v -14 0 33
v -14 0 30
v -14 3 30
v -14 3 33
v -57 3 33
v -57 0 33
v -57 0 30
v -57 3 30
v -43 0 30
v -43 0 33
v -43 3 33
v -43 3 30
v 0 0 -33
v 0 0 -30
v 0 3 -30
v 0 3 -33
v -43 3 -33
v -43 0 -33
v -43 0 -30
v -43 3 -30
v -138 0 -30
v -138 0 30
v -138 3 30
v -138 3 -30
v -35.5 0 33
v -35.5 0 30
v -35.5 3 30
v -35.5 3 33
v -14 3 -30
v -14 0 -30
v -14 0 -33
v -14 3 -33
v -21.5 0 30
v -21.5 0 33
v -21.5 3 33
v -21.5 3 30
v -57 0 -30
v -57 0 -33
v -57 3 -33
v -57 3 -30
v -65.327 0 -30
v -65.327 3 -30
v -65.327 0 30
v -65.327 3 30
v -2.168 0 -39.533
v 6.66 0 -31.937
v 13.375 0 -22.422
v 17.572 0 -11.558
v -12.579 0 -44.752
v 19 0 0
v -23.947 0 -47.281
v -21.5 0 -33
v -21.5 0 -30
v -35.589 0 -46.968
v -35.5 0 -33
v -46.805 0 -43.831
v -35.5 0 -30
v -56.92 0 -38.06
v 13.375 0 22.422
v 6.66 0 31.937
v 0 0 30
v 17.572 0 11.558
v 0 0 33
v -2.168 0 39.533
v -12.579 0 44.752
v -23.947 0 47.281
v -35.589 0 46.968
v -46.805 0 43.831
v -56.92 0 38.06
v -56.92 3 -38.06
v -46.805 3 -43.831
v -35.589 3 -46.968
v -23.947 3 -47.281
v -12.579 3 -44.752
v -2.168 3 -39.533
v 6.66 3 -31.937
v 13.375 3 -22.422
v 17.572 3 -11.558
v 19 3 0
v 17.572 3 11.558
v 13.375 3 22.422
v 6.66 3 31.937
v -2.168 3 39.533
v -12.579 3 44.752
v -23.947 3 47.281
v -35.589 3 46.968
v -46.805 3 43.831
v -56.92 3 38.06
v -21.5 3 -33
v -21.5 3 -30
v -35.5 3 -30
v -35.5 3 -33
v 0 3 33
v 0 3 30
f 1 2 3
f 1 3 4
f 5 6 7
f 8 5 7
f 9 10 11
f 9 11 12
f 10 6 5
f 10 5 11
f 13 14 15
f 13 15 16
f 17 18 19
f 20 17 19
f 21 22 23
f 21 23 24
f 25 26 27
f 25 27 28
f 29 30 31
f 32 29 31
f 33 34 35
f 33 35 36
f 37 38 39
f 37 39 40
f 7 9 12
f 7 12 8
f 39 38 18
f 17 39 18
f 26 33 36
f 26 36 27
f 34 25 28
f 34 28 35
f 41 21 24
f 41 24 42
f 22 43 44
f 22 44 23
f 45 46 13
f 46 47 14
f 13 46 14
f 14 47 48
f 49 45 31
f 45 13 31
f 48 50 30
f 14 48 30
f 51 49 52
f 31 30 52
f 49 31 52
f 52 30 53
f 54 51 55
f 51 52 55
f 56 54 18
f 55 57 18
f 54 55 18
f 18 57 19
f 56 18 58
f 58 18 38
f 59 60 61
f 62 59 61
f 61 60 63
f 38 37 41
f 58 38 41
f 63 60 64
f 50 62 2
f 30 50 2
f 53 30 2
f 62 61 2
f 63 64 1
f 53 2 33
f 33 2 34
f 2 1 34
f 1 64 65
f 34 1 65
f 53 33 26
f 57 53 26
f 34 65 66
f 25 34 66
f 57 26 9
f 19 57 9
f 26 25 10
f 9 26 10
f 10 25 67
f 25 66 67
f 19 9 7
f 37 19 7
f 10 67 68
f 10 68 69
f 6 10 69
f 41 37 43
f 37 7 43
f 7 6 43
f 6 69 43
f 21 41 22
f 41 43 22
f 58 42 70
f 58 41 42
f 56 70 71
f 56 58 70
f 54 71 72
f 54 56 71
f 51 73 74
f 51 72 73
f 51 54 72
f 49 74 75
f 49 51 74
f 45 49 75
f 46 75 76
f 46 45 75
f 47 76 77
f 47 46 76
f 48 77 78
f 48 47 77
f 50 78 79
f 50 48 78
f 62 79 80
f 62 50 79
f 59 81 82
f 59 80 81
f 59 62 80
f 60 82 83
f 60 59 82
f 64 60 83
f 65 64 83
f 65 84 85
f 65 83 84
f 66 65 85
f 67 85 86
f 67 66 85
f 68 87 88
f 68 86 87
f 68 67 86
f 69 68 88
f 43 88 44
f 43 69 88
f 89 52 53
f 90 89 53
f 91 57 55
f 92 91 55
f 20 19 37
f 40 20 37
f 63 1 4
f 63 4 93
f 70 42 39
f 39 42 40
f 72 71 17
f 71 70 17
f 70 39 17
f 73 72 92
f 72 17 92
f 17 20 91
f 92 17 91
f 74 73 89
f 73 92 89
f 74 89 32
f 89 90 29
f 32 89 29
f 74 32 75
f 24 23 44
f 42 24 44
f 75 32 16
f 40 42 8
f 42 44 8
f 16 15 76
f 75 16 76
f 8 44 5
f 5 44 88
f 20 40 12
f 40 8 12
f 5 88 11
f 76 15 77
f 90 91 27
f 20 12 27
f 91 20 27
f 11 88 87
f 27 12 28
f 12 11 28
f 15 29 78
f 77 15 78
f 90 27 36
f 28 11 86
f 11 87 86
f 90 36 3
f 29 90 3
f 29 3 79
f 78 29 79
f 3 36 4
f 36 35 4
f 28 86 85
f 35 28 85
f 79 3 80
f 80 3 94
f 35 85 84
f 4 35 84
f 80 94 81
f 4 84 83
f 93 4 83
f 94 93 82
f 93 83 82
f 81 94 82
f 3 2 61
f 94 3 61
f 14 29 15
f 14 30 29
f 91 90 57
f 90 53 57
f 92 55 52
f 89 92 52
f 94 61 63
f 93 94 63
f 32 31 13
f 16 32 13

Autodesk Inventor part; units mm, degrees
ref_plane "YZ Plane" through (0, 0, 0) normal (1, 0, 0) x (0, 1, 0)
ref_plane "XZ Plane" through (0, 0, 0) normal (0, 1, 0) x (-1, 0, 0)
ref_plane "XY Plane" through (0, 0, 0) normal (0, 0, 1) x (1, 0, 0)
sketch "Boceto1" plane through (0, 0, 0) normal (0, 1, 0) x (-1, 0, 0)
  circle A0 centre (28.5, 0) radius 1.5
  circle A1 centre (28.5, -8) radius 1.5
  circle A2 centre (28.5, 8) radius 1.5
  circle A3 centre (36.5, 0) radius 1.5
  circle A4 centre (20.5, 0) radius 1.5
  circle A5 centre (28.5, 0) radius 47.5
  line L0 (57, 33) -> (43, 33)
  line L1 (43, 33) -> (43, 30)
  line L2 (35.5, 30) -> (35.5, 33)
  line L3 (35.5, 33) -> (21.5, 33)
  line L4 (21.5, 33) -> (21.5, 30)
  line L5 (14, 30) -> (14, 33)
  line L6 (14, 33) -> (0, 33)
  line L7 (43, 30) -> (57, 30)
  line L8 (21.5, 30) -> (35.5, 30)
  line L9 (14, 30) -> (0, 30)
  line L10 (0, 30) -> (0, 33)
  line L11 (57, 33) -> (57, 30)
  line L12 (35.5, -30) -> (35.5, -33)
  line L13 (21.5, -30) -> (35.5, -30)
  line L14 (35.5, -33) -> (21.5, -33)
  line L15 (21.5, -33) -> (21.5, -30)
  line L16 (57, -33) -> (43, -33)
  line L17 (43, -33) -> (43, -30)
  line L18 (43, -30) -> (57, -30)
  line L19 (14, -30) -> (14, -33)
  line L20 (14, -30) -> (0, -30)
  line L21 (14, -33) -> (0, -33)
  line L22 (0, -30) -> (0, -33)
  line L23 (57, -33) -> (57, -30)
extrude "Extrusión1" add sketch "Boceto1" along normal blind 3
sketch "Boceto2" plane through (-28.5, 0, 0) normal (0, -1, 0) x (1, 0, 0)
  circle A0 centre (0, 0) radius 3.5
  point P0 (28.5, 0)
  dimension "d23" = 7
extrude "Extrusión2" cut sketch "Boceto2" against normal blind 10
sketch "Boceto3" plane through (-28.5, 0, 0) normal (0, -1, 0) x (1, 0, 0)
  circle A0 centre (0, 0) radius 4.5
  point P0 (28.5, 0)
  dimension "d26" = 9
extrude "Extrusión3" cut sketch "Boceto3" against normal blind 10
sketch "Boceto4" plane through (-28.5, 0, 0) normal (0, -1, 0) x (1, 0, 0)
  arc A0 (-36.5, 30) -> (-36.5, -30) centre (0, 0) ccw
  line L0 (-28.5, 30) -> (-28.5, 33) projected
  line L1 (-36.5, 30) -> (-109.5, 30)
  line L2 (-109.5, 30) -> (-109.5, -30)
  line L3 (-28.5, -33) -> (-28.5, -30) projected
  line L4 (-109.5, -30) -> (-36.5, -30)
extrude "Extrusión4" add sketch "Boceto4" against normal blind 3
sketch "Boceto5" plane through (0, 3, 0) normal (0, 1, 0) x (1, 0, 0)
  line L0 (-11.1092, 17.1983) -> (-42.6801, 17.1983)
  line L1 (-42.6801, 17.1983) -> (-42.6801, -13.2583)
  line L2 (-42.6801, -13.2583) -> (-11.1092, -13.2583)
  line L3 (-11.1092, -13.2583) -> (-11.1092, 17.1983)
  point P0 (0, 0)
extrude "Extrusión5" add sketch "Boceto5" against normal blind 3
properties part number "base3"
